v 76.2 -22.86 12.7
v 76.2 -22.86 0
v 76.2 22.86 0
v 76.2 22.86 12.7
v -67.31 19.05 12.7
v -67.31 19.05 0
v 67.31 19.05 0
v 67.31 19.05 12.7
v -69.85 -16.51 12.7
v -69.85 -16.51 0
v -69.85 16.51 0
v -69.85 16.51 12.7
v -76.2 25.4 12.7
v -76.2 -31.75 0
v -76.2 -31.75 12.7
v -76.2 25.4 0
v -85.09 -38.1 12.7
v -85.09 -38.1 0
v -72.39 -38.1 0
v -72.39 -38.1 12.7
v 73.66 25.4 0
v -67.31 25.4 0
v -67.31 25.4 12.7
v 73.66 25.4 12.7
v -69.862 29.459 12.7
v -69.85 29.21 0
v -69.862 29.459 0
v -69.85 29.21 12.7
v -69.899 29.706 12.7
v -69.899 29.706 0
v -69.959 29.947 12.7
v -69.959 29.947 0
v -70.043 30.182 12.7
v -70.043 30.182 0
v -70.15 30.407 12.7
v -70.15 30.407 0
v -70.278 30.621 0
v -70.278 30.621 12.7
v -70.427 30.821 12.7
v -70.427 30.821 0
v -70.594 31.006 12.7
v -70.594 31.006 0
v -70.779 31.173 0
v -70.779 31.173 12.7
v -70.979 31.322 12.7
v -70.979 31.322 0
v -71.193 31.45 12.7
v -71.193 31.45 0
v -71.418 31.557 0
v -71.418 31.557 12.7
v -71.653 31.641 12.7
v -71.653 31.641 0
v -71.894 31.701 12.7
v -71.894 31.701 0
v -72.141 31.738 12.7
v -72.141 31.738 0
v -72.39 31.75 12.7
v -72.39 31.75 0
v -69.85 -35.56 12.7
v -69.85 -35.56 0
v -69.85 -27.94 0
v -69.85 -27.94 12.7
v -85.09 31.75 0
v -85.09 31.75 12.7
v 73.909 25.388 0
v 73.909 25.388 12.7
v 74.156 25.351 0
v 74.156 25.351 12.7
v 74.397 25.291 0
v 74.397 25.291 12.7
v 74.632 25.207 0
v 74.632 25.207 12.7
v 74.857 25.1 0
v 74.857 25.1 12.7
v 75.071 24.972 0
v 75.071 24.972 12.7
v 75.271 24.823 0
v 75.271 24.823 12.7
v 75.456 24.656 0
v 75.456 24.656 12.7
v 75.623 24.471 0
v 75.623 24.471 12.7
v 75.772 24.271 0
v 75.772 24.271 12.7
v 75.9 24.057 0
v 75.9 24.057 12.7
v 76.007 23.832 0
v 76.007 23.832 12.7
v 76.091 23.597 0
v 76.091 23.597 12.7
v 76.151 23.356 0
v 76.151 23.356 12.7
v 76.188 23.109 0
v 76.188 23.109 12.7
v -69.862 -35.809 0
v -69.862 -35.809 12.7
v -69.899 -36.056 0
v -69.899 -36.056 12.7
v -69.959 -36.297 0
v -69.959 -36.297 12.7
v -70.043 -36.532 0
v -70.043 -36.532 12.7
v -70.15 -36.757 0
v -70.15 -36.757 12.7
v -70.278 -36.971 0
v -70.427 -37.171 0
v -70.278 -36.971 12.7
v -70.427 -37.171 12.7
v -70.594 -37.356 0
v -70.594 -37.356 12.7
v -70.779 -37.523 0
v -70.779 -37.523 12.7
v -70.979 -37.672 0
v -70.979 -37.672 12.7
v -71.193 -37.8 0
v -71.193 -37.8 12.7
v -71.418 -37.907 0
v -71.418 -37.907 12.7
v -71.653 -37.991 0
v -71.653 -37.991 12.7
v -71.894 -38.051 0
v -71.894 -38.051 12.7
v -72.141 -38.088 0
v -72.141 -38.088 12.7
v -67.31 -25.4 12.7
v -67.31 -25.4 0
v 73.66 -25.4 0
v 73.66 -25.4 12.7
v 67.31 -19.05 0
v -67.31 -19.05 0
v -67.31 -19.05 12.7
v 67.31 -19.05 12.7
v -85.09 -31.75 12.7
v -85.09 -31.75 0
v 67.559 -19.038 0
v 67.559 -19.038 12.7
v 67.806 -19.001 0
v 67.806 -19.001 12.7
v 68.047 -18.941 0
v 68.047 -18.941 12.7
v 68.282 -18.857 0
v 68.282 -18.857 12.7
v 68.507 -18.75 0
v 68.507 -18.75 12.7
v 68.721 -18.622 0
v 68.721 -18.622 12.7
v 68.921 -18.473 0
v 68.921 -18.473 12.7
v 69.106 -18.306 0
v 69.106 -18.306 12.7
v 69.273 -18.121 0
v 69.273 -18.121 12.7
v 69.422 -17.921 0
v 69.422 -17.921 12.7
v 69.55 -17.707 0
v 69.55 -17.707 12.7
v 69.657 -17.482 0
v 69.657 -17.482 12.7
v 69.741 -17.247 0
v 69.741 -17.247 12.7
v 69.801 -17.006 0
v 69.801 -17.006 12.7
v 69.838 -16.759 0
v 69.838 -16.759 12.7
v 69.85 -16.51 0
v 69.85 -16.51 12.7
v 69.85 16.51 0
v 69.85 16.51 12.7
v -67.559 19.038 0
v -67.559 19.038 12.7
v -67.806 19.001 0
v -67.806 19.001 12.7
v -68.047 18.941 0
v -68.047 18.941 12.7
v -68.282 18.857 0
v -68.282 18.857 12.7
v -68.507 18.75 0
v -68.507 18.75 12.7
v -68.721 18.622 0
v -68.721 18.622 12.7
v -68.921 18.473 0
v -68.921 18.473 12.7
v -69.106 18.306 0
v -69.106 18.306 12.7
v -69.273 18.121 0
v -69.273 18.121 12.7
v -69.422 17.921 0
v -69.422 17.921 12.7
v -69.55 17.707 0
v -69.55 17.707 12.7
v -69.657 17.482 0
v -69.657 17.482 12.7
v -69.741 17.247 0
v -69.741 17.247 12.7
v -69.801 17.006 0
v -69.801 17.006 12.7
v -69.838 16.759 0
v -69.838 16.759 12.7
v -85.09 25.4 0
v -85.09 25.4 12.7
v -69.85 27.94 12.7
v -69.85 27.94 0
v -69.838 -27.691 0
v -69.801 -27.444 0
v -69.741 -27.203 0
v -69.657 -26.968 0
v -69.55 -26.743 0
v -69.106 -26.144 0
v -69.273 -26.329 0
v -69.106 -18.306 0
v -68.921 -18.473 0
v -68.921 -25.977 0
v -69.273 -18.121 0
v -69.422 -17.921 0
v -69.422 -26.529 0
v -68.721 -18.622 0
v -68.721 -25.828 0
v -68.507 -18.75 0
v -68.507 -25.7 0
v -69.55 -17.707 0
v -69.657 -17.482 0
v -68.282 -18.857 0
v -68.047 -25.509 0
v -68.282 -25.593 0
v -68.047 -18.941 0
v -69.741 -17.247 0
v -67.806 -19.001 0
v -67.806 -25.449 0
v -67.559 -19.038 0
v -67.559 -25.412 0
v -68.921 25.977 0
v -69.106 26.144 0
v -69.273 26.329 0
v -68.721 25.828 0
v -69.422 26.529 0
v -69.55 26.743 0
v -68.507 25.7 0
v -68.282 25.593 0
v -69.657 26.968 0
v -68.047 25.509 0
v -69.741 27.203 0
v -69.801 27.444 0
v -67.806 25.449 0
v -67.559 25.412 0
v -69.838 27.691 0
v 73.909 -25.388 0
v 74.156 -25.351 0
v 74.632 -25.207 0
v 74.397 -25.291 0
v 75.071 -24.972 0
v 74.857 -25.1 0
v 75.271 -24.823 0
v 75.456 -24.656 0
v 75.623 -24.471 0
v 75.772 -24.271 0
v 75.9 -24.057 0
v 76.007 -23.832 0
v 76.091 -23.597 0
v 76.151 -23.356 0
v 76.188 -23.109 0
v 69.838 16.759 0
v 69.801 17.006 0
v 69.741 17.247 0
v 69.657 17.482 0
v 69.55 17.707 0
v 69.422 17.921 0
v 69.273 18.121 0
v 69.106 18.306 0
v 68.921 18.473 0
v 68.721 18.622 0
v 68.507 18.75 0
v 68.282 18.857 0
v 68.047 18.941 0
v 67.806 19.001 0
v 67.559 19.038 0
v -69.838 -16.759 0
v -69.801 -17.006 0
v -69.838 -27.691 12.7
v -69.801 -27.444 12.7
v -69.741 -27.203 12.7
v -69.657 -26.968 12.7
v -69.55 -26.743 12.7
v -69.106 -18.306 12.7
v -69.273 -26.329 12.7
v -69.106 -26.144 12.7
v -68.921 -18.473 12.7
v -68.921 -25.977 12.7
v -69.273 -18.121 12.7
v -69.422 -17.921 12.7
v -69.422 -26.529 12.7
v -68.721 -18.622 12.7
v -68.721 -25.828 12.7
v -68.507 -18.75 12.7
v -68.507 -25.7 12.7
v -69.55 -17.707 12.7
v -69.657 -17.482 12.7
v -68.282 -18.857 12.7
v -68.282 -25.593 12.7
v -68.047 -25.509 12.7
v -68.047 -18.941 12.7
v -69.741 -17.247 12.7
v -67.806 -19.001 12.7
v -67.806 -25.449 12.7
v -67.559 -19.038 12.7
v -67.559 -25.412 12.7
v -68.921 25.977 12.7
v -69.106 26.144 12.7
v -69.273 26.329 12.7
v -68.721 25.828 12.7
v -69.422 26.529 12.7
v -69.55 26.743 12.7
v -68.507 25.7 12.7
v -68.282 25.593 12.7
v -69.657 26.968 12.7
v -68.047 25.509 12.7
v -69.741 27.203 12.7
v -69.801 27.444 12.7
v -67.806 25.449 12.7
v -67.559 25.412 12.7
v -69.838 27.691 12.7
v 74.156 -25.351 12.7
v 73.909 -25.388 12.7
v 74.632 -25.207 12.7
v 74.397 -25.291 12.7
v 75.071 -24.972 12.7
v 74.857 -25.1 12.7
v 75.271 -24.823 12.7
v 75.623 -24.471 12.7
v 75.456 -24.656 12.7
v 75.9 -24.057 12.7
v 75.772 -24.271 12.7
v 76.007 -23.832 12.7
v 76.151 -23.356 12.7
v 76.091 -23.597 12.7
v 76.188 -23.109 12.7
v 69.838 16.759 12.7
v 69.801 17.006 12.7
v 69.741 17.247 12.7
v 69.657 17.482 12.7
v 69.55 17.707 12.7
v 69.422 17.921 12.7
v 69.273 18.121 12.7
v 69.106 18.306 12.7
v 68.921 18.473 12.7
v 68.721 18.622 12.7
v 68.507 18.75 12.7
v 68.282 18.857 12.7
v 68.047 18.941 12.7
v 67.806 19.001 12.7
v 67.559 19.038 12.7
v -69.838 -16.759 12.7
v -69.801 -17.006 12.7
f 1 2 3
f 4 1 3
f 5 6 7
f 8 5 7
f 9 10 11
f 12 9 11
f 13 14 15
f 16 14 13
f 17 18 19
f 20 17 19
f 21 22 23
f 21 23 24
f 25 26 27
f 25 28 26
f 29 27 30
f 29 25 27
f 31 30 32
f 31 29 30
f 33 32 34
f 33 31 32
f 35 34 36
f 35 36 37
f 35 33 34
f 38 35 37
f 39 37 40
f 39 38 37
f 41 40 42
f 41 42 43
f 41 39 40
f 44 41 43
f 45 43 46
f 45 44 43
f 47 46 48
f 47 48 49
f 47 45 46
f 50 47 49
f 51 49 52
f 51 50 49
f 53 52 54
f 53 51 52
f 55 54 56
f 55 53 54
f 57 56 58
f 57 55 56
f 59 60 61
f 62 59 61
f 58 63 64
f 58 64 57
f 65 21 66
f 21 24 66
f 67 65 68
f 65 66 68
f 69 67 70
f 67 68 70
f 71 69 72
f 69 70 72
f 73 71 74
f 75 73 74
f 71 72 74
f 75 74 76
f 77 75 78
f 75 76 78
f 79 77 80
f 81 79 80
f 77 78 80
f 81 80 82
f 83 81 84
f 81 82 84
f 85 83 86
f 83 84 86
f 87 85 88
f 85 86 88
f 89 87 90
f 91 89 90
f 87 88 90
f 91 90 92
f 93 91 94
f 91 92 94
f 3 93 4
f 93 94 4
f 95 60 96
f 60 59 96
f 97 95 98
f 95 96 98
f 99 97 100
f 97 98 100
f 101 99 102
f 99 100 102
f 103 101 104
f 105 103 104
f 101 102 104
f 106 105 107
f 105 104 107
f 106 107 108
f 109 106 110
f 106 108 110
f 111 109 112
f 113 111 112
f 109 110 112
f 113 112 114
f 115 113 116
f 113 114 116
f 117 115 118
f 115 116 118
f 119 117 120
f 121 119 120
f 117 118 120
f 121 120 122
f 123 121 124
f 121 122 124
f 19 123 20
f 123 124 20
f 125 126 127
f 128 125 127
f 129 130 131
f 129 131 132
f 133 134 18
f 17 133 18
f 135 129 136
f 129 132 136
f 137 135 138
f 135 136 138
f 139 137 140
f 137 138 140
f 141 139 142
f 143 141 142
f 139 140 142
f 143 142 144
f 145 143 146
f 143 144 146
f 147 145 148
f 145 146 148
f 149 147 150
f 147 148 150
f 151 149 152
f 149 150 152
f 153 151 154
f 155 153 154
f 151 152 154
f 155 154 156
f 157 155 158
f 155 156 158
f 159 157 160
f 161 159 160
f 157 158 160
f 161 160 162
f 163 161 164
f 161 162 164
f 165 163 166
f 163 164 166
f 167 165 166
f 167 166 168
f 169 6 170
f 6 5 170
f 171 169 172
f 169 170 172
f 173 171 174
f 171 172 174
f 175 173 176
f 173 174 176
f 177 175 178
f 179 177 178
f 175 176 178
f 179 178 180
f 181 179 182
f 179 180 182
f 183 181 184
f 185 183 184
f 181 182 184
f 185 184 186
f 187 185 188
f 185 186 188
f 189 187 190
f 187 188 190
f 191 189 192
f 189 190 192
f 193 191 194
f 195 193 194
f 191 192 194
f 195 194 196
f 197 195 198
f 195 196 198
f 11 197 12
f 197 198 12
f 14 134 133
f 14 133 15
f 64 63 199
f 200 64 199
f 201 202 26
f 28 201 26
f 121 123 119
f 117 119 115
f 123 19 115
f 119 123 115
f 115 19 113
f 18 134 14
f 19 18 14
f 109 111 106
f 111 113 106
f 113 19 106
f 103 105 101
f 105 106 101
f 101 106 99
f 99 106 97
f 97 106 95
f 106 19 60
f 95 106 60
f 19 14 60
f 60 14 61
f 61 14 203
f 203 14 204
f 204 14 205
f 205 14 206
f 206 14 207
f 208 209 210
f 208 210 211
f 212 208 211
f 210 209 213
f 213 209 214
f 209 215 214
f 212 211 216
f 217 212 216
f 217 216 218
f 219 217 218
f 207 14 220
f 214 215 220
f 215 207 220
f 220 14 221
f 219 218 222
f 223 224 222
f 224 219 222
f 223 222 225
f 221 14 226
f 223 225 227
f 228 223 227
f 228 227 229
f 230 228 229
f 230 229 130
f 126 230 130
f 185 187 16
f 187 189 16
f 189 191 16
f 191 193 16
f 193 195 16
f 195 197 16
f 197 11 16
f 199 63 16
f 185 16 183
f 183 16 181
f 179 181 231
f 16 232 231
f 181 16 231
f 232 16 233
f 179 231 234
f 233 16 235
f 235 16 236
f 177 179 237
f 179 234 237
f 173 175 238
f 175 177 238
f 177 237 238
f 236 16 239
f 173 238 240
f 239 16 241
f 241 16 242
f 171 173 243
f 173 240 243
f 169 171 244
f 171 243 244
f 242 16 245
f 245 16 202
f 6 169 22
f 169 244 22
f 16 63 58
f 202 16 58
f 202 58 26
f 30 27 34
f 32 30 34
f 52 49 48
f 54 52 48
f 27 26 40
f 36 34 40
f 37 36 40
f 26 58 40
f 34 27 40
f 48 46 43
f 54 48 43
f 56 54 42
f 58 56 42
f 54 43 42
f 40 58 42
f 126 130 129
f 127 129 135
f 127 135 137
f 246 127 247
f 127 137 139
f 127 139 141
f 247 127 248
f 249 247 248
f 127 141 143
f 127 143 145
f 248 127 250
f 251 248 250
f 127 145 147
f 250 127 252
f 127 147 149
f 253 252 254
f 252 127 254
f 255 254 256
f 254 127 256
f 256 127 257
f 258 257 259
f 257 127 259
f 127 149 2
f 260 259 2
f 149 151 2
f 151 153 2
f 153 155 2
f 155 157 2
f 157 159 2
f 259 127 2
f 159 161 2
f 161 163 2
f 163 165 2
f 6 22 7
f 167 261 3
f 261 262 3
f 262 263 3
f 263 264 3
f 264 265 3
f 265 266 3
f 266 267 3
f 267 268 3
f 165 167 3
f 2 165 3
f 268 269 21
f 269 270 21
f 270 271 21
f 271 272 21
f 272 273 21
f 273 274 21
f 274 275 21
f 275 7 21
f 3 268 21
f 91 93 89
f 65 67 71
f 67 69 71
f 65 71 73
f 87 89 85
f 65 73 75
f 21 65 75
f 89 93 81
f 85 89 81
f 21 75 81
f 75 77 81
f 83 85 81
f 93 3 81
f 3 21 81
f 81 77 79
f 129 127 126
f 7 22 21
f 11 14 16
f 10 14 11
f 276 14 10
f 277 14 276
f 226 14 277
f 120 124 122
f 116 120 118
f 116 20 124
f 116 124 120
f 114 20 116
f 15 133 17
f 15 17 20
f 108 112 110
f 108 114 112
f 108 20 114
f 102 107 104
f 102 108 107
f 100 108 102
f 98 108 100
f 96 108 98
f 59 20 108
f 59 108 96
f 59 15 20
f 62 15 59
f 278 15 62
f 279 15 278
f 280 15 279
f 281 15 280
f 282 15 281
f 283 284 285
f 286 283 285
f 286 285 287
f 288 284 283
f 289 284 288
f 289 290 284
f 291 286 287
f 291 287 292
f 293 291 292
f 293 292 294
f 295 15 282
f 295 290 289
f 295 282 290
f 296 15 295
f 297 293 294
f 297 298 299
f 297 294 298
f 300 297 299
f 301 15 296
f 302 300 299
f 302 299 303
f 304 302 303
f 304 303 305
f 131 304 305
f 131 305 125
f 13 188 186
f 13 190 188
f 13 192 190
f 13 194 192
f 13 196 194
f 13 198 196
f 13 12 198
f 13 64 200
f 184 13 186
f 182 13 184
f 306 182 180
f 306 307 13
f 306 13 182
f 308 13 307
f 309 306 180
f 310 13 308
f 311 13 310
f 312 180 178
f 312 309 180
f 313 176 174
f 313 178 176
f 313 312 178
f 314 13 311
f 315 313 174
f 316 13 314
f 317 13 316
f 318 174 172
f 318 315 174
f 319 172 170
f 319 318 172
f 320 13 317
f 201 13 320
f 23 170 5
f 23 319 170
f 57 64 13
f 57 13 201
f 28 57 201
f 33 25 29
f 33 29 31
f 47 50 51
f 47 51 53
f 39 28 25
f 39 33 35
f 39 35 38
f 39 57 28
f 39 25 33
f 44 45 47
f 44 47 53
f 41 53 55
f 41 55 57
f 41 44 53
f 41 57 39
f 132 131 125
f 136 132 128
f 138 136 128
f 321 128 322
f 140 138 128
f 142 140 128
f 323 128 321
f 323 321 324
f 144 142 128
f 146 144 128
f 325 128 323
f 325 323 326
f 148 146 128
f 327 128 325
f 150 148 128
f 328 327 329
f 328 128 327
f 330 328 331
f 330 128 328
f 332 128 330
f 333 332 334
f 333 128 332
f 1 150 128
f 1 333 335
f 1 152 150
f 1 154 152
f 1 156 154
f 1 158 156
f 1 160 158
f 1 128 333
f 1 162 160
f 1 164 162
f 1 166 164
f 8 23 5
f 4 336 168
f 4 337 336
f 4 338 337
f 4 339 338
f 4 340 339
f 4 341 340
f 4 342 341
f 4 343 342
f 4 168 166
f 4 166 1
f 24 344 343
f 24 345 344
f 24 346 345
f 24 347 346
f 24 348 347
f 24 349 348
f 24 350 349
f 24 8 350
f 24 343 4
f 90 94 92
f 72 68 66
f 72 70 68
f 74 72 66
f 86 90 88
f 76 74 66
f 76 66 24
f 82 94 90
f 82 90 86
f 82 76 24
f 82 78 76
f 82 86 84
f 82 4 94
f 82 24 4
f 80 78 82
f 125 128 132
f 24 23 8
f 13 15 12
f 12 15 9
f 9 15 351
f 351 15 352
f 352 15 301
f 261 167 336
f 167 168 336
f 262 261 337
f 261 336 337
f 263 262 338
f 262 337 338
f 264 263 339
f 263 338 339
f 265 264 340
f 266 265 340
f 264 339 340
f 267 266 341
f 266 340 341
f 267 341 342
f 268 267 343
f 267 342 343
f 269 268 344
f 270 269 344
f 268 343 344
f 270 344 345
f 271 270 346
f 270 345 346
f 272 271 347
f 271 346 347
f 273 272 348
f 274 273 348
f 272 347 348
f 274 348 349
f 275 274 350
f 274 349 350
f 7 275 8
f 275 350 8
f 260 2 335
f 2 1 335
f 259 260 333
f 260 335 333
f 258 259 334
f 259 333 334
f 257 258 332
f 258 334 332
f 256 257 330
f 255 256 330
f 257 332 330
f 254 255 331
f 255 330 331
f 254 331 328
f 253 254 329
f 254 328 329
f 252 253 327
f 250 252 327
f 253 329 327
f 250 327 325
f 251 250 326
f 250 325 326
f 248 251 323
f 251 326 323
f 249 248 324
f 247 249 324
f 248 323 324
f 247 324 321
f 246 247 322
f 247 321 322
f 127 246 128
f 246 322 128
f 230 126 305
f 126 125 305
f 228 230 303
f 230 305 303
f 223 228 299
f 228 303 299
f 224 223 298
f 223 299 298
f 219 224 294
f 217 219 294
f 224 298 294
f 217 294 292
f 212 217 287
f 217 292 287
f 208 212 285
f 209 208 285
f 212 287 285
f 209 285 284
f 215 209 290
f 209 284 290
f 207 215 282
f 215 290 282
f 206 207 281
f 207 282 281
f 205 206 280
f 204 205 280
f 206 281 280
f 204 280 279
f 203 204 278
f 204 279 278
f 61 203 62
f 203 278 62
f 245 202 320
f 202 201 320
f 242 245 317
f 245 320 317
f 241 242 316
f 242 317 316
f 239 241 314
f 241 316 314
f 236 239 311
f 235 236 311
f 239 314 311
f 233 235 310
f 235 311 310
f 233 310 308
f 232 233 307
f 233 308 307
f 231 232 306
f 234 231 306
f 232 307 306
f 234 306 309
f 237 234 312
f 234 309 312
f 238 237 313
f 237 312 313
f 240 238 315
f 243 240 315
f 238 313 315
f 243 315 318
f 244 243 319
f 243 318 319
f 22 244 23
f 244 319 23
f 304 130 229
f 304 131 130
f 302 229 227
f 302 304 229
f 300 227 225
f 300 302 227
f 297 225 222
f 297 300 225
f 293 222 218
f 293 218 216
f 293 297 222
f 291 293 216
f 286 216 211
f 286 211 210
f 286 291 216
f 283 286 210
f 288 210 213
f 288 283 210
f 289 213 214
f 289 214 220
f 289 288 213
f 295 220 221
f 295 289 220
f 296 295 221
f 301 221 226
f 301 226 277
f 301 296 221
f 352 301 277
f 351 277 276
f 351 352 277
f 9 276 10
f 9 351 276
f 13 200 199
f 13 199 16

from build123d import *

# Parameters (mm, degrees)
F0_W     = 152.4
F0_H     = 50.8
F0_W_2   = 139.7
F0_H_2   = 38.1
F1_DEPTH = 12.7
F2_W     = 27.94
F2_H     = 69.85
F2_W_2   = 8.89
F2_H_2   = 57.15
F3_DEPTH = 12.7
F4_R     = 2.54
F6_DEPTH = 12.701


with BuildPart() as f1:
    # F0 (on Top) → F1 (new body)
    with BuildSketch(Plane.XY):
        Rectangle(F0_W, F0_H)
        Rectangle(F0_W_2, F0_H_2, mode=Mode.SUBTRACT)
    extrude(amount=F1_DEPTH)

    # F2 (on Top) → F3 (join)
    with BuildSketch(Plane.XY):
        with Locations((-83.82, -3.175)):
            Rectangle(F2_W, F2_H)
        with Locations((-80.645, -3.175)):
            Rectangle(F2_W_2, F2_H_2, mode=Mode.SUBTRACT)
    extrude(amount=F3_DEPTH)

    # F4
    f4_edges = [f1.edges().sort_by_distance(p)[0] for p in [
        (-69.85, 19.05, 6.35),
        (69.85, 19.05, 6.35),
        (69.85, -19.05, 6.35),
        (-69.85, -19.05, 6.35),
        (-69.85, 25.4, 6.35),
        (76.2, 25.4, 6.35),
        (76.2, -25.4, 6.35),
        (-69.85, -25.4, 6.35),
        (-69.85, 31.75, 6.35),
        (-69.85, -38.1, 6.35),
    ]]
    fillet(f4_edges, radius=F4_R)

    # F5 (on face) → F6 (cut, through all)
    with BuildSketch(Plane(origin=(0, 0, 0), x_dir=(1, 0, 0), z_dir=(0, 0, -1))):
        Polygon((-97.79, -31.75), (-85.09, -31.75), (-85.09, -25.4), (-85.09, 31.75), (-85.09, 38.1), (-97.79, 38.1), align=None)
    extrude(amount=-F6_DEPTH, mode=Mode.SUBTRACT)


solid = f1.part
